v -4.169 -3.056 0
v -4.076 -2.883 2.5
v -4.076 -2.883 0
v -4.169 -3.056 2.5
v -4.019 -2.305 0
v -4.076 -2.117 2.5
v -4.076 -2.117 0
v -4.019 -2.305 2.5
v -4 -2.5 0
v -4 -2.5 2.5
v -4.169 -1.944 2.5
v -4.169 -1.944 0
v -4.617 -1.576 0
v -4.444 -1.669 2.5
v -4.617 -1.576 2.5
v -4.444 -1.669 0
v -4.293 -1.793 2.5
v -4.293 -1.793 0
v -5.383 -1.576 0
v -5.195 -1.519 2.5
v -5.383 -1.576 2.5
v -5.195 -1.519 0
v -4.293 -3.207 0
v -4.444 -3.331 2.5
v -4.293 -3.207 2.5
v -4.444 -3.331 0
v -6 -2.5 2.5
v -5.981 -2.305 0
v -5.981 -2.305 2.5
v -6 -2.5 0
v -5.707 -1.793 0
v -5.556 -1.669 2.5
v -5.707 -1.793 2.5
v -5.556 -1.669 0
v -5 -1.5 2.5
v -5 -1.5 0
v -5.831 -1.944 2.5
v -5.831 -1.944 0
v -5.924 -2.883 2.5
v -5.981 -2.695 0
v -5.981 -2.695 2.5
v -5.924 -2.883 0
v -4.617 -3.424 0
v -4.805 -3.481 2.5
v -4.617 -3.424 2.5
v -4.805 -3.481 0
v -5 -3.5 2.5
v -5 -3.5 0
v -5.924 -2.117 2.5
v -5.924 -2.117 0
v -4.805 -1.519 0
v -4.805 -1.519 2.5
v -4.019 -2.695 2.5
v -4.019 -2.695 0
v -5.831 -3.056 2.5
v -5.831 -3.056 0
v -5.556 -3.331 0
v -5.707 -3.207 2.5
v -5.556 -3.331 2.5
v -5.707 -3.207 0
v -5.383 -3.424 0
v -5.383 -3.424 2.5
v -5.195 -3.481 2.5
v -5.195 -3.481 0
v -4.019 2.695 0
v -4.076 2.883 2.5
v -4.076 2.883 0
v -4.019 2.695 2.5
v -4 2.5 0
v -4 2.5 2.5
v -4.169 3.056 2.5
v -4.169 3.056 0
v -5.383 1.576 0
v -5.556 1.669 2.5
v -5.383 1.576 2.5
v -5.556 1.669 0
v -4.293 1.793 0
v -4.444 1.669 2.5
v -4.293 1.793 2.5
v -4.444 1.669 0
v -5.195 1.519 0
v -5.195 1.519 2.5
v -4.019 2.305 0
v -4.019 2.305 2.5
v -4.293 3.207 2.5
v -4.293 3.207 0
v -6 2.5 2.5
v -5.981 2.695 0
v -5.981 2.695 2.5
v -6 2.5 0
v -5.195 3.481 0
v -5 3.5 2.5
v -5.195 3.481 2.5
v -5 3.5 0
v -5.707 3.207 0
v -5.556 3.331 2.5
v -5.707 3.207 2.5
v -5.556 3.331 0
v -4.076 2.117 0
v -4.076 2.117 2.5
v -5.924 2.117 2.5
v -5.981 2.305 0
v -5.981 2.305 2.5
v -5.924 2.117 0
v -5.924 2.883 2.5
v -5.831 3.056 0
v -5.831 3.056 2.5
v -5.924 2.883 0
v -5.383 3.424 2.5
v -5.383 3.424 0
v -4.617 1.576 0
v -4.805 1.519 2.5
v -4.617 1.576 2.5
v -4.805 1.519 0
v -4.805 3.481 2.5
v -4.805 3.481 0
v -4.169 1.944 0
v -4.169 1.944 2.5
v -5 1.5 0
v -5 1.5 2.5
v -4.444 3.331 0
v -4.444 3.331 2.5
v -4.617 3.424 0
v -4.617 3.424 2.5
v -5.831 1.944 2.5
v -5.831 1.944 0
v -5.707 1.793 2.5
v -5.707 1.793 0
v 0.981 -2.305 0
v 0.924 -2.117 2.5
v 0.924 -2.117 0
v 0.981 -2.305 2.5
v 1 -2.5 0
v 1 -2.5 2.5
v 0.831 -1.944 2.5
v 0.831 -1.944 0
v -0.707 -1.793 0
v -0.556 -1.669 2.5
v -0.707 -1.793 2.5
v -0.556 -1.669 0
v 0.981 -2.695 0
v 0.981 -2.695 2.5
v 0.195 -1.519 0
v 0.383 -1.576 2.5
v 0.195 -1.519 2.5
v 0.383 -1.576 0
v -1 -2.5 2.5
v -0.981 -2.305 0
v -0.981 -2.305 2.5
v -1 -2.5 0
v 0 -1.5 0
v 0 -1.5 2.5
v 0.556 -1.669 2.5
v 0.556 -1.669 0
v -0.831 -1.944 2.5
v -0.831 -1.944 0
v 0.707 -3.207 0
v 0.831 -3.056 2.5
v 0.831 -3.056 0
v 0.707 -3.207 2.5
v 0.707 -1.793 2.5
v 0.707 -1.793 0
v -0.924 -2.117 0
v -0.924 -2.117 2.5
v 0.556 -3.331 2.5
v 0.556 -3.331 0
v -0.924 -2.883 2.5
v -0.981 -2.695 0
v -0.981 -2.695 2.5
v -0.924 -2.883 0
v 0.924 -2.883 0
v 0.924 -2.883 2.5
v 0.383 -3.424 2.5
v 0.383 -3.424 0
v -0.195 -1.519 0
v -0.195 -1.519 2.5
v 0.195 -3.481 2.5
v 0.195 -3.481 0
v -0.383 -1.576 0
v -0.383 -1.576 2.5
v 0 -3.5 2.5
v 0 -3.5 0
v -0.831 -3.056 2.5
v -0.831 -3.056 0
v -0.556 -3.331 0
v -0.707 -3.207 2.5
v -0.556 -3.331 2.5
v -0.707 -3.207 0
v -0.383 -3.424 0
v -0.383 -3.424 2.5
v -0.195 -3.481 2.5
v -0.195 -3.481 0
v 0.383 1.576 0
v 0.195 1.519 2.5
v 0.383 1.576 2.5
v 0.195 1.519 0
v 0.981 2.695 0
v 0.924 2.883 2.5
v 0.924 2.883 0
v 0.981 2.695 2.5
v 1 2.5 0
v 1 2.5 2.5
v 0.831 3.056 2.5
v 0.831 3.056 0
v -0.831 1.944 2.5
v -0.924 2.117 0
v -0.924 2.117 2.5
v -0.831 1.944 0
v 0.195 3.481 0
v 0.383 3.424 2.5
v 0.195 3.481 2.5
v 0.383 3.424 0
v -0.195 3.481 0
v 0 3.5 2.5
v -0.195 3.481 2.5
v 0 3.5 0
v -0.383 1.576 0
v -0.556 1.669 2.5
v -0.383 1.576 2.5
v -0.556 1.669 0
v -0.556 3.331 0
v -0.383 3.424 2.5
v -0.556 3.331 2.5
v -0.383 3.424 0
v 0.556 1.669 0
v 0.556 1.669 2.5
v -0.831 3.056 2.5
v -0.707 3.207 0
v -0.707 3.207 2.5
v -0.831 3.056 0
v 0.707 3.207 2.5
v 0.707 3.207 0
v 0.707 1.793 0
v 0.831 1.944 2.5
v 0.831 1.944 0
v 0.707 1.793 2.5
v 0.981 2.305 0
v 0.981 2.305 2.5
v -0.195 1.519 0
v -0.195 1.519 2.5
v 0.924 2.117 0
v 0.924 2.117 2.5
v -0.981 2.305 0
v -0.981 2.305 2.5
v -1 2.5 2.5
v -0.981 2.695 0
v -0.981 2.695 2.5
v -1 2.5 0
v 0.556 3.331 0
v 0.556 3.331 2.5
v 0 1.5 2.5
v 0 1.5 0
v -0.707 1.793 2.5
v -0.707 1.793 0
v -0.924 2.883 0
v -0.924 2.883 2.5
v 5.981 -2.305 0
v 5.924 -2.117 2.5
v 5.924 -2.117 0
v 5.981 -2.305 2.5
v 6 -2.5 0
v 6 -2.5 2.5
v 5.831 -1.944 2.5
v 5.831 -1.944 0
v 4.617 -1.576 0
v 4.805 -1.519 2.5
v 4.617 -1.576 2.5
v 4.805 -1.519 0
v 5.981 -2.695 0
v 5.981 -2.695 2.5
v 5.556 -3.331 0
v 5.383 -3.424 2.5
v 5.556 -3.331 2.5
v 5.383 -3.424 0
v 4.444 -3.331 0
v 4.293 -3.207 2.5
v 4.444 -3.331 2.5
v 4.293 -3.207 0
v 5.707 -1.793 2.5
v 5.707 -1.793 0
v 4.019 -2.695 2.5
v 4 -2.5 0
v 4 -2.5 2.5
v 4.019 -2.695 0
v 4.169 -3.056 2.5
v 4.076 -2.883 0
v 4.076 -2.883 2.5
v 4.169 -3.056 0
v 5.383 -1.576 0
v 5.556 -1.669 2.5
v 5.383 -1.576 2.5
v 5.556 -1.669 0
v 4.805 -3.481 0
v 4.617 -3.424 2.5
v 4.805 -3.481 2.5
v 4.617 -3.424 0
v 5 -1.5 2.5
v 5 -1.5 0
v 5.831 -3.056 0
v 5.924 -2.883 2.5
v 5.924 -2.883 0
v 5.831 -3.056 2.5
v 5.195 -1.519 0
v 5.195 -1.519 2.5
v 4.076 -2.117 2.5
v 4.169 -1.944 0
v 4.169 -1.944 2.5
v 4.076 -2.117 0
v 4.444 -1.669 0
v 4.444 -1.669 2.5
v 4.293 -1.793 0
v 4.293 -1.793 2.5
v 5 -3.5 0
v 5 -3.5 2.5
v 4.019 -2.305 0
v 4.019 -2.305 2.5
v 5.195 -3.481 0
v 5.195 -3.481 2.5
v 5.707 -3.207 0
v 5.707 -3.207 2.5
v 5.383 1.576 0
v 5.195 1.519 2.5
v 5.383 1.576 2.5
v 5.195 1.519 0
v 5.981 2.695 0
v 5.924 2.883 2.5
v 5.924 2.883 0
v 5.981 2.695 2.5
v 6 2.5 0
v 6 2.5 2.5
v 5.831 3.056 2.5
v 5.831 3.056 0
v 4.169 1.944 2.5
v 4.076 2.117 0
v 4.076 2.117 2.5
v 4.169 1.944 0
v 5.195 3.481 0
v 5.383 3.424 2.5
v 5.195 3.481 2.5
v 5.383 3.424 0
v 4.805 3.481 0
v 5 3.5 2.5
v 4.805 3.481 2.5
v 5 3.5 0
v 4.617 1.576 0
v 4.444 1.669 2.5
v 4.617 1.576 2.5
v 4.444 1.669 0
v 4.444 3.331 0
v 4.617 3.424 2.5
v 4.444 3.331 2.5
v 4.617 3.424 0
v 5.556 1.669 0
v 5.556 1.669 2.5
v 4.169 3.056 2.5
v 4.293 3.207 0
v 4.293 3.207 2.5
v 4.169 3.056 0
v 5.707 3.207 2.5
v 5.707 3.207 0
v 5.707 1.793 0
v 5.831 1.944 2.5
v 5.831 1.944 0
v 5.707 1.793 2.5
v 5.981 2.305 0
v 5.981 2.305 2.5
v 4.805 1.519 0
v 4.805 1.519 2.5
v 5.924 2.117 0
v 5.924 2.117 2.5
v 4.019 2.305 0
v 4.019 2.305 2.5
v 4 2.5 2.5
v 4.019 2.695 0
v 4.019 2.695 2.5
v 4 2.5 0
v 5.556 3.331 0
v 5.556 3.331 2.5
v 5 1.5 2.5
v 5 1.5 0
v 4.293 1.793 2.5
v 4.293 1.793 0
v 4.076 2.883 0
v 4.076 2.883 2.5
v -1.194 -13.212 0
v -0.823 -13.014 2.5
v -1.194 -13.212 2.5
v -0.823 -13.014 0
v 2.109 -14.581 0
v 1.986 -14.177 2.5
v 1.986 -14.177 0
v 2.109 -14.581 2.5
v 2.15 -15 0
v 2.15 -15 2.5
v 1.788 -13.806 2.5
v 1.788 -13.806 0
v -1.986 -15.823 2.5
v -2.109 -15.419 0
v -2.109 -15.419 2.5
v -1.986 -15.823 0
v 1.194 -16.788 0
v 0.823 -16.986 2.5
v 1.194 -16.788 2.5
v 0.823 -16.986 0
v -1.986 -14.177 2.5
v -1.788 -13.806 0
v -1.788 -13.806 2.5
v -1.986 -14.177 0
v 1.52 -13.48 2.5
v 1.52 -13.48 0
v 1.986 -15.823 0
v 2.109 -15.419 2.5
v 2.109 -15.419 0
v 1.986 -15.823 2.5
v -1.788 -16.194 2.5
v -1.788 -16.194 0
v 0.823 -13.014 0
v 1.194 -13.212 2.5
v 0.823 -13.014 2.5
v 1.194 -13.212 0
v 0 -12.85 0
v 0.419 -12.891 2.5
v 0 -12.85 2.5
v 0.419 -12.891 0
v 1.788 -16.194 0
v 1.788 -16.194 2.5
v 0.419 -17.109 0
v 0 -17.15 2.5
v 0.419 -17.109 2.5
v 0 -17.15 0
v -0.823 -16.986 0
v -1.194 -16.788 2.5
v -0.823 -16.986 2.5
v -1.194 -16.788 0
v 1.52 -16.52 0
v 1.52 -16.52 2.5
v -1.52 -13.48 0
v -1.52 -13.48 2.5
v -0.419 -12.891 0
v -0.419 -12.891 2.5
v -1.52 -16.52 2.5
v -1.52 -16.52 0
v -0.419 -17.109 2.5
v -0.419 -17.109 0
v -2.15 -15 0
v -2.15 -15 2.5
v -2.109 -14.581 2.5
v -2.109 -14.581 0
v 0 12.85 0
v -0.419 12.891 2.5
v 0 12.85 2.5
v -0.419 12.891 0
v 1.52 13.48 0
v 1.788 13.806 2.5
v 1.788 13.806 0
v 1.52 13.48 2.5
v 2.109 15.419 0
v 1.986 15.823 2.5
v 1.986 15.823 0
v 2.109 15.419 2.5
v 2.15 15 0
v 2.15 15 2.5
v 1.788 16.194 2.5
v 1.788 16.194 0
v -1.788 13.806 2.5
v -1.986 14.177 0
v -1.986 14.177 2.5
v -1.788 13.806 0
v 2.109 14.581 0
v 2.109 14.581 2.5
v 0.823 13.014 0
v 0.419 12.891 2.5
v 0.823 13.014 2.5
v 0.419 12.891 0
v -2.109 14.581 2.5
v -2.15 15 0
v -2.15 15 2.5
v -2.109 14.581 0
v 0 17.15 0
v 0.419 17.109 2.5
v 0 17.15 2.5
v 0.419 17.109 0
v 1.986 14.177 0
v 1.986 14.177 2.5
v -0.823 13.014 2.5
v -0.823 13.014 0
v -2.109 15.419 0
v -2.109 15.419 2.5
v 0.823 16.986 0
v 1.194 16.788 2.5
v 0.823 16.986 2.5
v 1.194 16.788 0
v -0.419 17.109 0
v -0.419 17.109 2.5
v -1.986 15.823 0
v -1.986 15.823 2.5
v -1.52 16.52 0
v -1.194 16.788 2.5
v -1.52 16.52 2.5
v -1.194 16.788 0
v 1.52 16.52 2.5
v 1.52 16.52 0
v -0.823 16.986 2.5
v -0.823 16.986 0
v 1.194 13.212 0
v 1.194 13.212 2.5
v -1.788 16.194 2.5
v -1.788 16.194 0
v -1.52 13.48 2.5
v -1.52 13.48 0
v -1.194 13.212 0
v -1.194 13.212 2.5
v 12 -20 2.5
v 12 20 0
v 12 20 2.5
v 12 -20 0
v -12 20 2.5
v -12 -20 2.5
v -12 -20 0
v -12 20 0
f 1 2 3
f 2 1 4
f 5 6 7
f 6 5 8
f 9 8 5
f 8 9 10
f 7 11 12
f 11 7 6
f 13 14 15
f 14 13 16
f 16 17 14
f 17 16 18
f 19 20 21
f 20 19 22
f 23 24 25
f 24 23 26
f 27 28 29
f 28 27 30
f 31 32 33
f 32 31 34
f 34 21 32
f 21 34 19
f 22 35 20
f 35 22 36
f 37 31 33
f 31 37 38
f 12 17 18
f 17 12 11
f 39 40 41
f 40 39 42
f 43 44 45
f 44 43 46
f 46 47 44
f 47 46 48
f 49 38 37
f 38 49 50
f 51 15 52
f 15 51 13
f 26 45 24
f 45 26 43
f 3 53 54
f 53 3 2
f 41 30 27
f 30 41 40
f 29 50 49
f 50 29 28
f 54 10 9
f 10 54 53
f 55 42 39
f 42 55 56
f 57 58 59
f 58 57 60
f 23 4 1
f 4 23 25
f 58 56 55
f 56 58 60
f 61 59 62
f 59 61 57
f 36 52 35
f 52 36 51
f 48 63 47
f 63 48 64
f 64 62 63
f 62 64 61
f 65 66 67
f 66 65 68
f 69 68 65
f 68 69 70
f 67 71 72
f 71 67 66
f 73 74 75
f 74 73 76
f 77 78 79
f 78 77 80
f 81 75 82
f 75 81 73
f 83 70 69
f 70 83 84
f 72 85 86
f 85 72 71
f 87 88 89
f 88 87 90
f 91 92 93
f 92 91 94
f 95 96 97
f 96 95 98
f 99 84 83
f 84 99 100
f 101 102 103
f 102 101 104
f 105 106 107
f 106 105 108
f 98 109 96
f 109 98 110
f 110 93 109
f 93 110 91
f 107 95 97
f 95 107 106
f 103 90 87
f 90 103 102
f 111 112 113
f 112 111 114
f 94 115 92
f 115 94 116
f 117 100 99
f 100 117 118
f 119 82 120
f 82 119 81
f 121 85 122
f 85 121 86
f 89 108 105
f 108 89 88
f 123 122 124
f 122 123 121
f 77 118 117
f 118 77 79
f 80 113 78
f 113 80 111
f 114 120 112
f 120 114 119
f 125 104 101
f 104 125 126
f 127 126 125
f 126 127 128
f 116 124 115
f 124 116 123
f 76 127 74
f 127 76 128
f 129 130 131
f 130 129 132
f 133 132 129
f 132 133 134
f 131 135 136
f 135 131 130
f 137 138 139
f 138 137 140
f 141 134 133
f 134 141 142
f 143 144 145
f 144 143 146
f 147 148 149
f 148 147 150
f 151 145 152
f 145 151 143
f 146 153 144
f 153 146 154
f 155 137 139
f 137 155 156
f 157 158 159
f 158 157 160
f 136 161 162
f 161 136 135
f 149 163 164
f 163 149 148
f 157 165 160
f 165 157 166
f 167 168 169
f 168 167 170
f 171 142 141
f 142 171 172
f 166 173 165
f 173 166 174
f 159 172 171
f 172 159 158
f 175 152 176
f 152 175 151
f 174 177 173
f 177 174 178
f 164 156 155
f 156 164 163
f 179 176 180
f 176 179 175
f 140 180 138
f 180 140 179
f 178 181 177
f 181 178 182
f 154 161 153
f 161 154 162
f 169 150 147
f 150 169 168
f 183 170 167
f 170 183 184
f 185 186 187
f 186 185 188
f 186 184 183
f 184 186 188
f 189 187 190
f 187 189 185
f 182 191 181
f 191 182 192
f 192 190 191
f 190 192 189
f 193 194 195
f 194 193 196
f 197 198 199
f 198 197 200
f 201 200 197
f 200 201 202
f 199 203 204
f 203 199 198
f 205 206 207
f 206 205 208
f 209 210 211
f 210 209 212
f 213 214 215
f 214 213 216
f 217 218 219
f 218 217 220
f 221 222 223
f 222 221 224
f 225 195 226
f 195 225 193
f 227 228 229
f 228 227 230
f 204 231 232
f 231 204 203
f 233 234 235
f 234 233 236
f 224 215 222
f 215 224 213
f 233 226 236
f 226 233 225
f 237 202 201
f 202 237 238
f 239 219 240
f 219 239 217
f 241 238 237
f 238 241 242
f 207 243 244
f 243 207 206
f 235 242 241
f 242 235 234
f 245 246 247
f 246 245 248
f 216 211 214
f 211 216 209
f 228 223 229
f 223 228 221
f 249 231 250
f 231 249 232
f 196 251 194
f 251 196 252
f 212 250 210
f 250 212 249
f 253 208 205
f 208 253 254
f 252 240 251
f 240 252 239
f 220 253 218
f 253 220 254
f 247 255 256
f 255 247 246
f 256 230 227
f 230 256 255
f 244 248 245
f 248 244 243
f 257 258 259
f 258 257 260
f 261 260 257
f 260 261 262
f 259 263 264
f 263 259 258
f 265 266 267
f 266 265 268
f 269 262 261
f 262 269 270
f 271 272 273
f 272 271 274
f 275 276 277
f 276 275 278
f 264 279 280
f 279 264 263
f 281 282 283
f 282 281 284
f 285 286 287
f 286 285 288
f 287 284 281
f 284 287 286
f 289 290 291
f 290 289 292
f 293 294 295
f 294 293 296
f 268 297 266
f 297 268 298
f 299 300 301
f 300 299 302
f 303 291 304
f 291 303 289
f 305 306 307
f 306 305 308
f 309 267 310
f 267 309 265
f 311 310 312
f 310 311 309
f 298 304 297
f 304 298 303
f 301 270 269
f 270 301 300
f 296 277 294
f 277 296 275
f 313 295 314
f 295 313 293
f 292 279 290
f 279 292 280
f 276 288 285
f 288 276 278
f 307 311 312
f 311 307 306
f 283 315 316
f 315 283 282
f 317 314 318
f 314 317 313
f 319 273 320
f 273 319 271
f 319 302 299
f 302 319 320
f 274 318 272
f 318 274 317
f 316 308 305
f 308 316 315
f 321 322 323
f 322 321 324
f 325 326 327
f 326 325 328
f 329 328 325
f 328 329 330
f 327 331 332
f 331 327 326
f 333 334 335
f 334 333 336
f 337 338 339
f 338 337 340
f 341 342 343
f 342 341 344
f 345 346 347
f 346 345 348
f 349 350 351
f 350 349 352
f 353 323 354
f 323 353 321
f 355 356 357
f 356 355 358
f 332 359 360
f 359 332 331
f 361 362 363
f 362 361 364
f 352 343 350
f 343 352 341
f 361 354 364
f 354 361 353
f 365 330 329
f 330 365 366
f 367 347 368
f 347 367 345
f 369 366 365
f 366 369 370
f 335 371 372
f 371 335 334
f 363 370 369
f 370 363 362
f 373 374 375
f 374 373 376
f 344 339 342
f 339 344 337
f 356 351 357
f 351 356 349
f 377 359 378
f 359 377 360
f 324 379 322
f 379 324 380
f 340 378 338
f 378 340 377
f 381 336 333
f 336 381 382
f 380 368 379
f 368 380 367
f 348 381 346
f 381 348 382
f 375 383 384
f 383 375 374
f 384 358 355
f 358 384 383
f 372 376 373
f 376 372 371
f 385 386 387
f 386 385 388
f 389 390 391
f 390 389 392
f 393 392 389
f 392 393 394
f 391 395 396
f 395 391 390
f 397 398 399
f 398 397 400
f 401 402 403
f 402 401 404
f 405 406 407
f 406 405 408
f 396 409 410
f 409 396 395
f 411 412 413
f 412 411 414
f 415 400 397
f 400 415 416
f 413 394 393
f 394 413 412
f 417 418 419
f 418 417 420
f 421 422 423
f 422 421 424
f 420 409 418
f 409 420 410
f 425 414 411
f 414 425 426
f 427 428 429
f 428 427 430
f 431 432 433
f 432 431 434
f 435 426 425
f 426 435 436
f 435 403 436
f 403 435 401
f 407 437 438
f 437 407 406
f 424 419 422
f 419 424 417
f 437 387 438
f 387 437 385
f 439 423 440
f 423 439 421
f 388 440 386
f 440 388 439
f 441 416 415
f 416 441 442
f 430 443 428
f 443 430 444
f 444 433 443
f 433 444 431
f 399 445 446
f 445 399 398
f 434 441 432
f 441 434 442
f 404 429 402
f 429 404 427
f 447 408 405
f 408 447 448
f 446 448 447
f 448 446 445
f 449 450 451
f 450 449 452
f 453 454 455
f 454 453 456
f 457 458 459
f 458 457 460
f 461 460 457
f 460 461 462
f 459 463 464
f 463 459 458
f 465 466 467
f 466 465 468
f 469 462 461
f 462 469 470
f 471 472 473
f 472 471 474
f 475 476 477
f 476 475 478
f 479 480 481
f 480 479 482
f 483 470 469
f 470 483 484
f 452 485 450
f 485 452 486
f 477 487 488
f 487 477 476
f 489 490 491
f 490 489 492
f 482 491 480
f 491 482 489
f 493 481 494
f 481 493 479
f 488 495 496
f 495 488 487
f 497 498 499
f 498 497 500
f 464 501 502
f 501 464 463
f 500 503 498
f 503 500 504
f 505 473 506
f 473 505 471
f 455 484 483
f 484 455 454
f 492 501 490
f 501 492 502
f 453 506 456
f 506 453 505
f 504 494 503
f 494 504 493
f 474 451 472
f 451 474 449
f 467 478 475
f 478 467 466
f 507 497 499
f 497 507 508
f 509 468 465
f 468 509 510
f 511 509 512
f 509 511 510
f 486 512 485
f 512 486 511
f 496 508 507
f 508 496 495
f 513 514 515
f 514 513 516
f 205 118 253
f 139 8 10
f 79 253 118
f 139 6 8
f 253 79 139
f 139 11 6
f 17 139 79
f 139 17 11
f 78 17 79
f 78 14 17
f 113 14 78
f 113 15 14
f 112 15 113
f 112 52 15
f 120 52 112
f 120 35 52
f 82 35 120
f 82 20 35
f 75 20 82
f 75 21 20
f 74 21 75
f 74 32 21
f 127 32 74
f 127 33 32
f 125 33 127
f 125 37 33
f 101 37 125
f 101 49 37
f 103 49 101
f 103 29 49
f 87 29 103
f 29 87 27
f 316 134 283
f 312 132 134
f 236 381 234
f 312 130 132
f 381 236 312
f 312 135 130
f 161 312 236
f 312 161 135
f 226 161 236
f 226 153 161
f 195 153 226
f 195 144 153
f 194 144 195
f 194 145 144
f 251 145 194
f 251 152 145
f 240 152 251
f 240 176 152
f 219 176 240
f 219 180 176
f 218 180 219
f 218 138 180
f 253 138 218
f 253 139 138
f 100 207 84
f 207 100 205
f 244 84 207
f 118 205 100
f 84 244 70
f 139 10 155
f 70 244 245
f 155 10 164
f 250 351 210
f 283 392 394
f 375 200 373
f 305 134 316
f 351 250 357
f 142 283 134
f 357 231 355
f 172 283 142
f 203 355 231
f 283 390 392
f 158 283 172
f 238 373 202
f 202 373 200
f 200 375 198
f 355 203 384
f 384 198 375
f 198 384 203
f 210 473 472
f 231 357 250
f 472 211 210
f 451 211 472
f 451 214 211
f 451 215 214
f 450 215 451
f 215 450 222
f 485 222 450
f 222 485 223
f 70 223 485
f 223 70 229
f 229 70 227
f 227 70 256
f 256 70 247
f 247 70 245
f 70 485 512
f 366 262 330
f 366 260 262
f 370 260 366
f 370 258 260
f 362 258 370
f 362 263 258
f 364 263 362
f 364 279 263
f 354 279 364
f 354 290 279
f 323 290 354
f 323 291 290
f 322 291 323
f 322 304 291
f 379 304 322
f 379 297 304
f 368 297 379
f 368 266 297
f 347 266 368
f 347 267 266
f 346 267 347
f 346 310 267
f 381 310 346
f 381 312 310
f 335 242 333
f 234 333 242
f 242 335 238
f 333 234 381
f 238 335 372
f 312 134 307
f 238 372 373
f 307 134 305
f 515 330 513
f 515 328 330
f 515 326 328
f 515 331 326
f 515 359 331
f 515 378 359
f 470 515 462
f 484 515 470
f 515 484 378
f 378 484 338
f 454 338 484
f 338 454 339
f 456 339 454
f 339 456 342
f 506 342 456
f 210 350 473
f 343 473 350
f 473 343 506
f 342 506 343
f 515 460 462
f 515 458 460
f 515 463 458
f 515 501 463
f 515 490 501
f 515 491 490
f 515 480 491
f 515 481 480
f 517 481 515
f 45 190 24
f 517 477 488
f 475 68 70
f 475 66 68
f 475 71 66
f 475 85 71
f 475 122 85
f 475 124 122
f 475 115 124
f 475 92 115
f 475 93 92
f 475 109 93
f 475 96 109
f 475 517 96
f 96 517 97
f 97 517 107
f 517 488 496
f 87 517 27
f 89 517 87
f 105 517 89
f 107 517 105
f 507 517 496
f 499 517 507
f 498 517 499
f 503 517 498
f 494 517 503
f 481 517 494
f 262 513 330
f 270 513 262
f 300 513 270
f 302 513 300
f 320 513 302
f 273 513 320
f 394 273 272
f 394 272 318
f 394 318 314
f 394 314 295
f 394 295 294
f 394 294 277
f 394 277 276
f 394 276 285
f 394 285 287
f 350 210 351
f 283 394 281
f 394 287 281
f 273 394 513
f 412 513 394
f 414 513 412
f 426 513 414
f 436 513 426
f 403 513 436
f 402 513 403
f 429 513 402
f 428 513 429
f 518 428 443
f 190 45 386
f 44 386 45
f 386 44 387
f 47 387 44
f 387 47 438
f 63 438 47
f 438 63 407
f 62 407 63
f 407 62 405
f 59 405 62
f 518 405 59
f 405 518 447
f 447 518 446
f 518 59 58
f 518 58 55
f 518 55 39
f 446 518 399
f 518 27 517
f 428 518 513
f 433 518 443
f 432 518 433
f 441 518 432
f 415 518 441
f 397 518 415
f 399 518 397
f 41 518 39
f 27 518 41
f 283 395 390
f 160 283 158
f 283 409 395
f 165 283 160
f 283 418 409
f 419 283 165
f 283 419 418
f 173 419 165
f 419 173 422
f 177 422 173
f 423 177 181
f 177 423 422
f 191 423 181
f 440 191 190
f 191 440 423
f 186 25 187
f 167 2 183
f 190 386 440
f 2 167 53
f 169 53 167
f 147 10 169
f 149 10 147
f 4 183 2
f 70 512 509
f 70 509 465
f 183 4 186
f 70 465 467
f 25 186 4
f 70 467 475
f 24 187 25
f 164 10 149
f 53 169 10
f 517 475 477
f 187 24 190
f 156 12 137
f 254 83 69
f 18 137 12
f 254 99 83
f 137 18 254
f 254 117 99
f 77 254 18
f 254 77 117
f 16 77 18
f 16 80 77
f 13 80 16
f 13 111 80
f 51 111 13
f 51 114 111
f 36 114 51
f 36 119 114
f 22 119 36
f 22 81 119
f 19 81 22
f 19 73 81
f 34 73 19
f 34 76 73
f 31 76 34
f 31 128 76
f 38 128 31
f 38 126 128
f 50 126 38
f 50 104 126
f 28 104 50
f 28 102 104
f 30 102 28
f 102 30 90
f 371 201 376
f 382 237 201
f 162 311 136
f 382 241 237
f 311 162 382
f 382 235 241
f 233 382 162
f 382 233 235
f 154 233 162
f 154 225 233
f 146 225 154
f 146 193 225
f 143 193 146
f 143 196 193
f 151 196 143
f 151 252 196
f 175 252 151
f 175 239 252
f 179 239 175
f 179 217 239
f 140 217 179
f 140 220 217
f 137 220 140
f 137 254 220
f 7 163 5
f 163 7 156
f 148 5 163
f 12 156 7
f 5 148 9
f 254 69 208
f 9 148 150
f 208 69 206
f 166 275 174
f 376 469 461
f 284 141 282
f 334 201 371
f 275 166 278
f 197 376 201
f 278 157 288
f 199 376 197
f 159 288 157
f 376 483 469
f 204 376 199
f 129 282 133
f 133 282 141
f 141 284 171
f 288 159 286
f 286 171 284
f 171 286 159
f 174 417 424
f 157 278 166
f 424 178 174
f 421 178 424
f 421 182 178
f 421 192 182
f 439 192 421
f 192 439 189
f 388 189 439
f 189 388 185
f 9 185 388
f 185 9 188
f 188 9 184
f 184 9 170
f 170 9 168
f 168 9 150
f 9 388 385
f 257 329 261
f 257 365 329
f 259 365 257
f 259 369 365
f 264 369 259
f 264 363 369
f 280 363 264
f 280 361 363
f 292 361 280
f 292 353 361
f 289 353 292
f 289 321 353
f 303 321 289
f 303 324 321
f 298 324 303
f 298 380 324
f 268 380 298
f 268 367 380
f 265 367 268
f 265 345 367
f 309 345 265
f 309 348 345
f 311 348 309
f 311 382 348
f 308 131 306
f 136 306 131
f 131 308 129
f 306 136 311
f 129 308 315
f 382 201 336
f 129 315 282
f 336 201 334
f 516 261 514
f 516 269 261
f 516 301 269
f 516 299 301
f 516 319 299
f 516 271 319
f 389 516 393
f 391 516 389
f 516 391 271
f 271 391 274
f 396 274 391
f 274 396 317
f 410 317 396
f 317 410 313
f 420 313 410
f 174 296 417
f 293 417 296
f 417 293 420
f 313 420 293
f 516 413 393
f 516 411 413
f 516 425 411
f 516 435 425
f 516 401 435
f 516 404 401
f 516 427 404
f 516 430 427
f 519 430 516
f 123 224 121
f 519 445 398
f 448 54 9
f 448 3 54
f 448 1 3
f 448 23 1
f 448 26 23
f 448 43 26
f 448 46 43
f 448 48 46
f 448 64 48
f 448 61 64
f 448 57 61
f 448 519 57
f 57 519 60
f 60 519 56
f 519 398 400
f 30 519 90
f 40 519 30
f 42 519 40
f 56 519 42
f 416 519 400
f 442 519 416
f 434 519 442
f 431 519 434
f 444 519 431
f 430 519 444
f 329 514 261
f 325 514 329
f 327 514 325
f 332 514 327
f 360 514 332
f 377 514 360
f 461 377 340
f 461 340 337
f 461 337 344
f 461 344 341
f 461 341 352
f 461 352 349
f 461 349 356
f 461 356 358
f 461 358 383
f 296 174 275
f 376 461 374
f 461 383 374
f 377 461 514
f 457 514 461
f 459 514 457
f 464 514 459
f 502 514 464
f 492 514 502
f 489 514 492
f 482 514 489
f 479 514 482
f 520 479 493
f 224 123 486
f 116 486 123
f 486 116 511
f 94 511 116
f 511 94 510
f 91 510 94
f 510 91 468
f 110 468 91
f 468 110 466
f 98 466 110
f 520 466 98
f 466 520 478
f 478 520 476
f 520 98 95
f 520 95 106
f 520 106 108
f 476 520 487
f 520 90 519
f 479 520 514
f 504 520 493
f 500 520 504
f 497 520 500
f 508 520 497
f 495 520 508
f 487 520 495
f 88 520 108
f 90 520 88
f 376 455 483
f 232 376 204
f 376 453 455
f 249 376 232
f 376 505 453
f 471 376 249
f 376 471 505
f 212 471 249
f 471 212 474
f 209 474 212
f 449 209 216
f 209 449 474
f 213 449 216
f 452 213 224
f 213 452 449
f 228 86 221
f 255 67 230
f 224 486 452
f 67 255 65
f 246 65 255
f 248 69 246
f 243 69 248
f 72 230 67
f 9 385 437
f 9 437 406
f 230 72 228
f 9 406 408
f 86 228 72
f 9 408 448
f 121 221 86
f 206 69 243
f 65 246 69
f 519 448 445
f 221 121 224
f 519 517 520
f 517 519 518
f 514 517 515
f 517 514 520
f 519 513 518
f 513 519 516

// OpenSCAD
// ============================================================
// RS4 Pro RSA/NATOポート用 ポゴピン変換ハウジング（パラメトリック）
// ============================================================
//
// 【前提】DJI R SDK文書 Figure 39（v2.5, p.19）の図は旧世代(RS2)の
// 「突起ピン型」コネクタを描いており、RS4 Proの実物（平面パッド×6を
// 2×3グリッド配置＋上下M4ボルト穴でアクセサリ固定）とは形状が異なる。
// 既存STL（3d-print-ronin-can-connector.stl）はRS2向け8コンタクト
// 設計のため、そのままではRS4 Proに物理的に合わない可能性が高い。
//
// このファイルは実測値を下の PARAMETERS セクションに埋めるだけで
// RS4 Pro実機に合わせたハウジングを再生成できるようにしたテンプレート。
// 採寸手順は同ディレクトリの README.md を参照。
//
// 【使い方】
//   1. TEST_MODE = true でまず「穴位置確認用の平板」だけ印刷し、
//      実機に当てて6パッド全部にちゃんと重なるか確認する
//      （ここで数値を追い込む。ポゴピンはまだ実装しない）
//   2. 位置がずれなければ TEST_MODE = false にしてポゴピン用ボアと
//      配線室付きのフルモデルを生成→印刷→ポゴピン圧入/はんだ
//
// ============================================================

// ---------- PARAMETERS（★実測して埋める） ----------

// 動作モード: true=穴位置確認用の薄板のみ / false=フルモデル
TEST_MODE = true;

// パッドグリッド: 2列(row) × 3行(col) 想定。列間隔・行間隔をそれぞれ実測
pad_pitch_col   = 5.0;   // ★実測: 横方向(列)のパッド中心間距離 [mm]
pad_pitch_row   = 5.0;   // ★実測: 縦方向(行)のパッド中心間距離 [mm]
pad_diameter    = 2.0;   // ★実測: パッド自体の直径（接触面） [mm]
num_cols        = 3;     // グリッド列数（写真通りなら3のはず）
num_rows        = 2;     // グリッド行数（写真通りなら2のはず）

// 上下のM4固定穴（アクセサリを本体にボルト留めする穴）
mount_hole_dia     = 4.3;  // M4クリアランス穴 [mm]（M4ネジ径4.0+遊び）
mount_hole_spacing = 30.0; // ★実測: 上穴-下穴の中心間距離 [mm]
mount_hole_offset_x = 0;   // ★実測: パッドグリッド中心から見た穴の左右オフセット [mm]

// パッド面からの窪み量（実物はパッドが窪みの中にある、との観察あり）
pad_recess_depth = 0.5;  // ★実測: パッド面がハウジング取り付け面から何mm奥か [mm]

// ハウジング寸法
housing_w = 24;      // 全体の幅
housing_h = 40;      // 全体の高さ（M4穴を含む全長より少し大きく）
housing_wall_t = 3;  // 側壁厚
plate_t = 2.5;        // 取り付け面プレートの厚み（TEST_MODEはこれだけの板になる）

// ポゴピン（Preci-Dip 811-S1系を想定。発注前にデータシートで要再確認）
//
// 【固定方法（重要）】単純な一本ボアの圧入だけだと保持力が弱く、実際に
// 「接着できない/スコスコする」問題が出た。そこで二段ボアにする:
//   ①前面ランド（pogo_land_dia × pogo_land_len）
//     パッド面すぐ下、ピン外径にきっちり合わせた圧入代。ここを長めに
//     取ることでピンの直進性（パッドに対して垂直に立つ）が出るのと、
//     接着剤が毛細管現象で前面（接点面）まで染み出るのを防ぐ壁になる。
//   ②後方ポケット（pogo_glue_pocket_dia、深さ＝pogo_bore_depth−pogo_land_len）
//     配線室側に大きく開いた空間。配線室は既に外へ開放されているので、
//     ピンを高さ合わせして圧入した後、ここへエポキシ/UV硬化樹脂を
//     配線室側から流し込んで恒久固定できる。接点面には接着剤が一切
//     回らない構造。
//
// 【組み立て手順】
//   1. ピンを後ろ（配線室側）からランドへ通し、先端がパッド接触に必要な
//      突き出し量になるまで押し込む。ハウジング前面を平らな治具/ガラス板
//      に当てて全ピンを同時に押すと高さが揃う
//   2. マスキングテープ等で仮固定し、後方ポケットにエポキシを注入
//   3. 硬化を待ってから配線（ハンダ）
//
// Preci-Dip 811-S1系にツバ(フランジ)があれば、pogo_land_len をその
// フランジ位置に合わせるとポケット段差がハードストップになりさらに
// 高さ精度が上がる。データシート確認のうえ調整すること。
pogo_bore_dia    = 1.55; // ★前面ランド径（ピン外径+わずかな圧入代）[mm]。要データシート確認
pogo_land_len    = plate_t + 1.5; // 前面ランド長 [mm]（圧入+直進性+毛細管防止）
pogo_glue_pocket_dia = pogo_bore_dia + 1.2; // 後方エポキシポケット径 [mm]
pogo_bore_depth  = 6.0;  // ボア総深さ（前面から。ピン全長に合わせる）[mm]
pogo_body_len    = 8.5;  // ポゴピン全長の目安（配線室の深さ計算に使用）

// 配線室（背面にケーブルを引き出す空間）
wire_cavity_depth = 10;

// AD_COMプルダウン抵抗（10〜100kΩ）をコネクタ側に内蔵するためのポケット
// 「ESP32側配線し忘れ」を構造的に防ぐ狙い（2026-08-31の知見: 未実装が
// 疑われた実績あり）
resistor_pocket = true;
resistor_pocket_w = 6;
resistor_pocket_h = 3;
resistor_pocket_d = 3;

// ---------- 内部計算用 ----------
grid_w = (num_cols - 1) * pad_pitch_col;
grid_h = (num_rows - 1) * pad_pitch_row;

module pad_positions() {
    for (c = [0 : num_cols - 1])
        for (r = [0 : num_rows - 1])
            translate([
                -grid_w/2 + c * pad_pitch_col,
                -grid_h/2 + r * pad_pitch_row,
                0
            ])
            children();
}

module mount_holes() {
    for (dy = [-mount_hole_spacing/2, mount_hole_spacing/2])
        translate([mount_hole_offset_x, dy, 0])
        children();
}

// ポゴピン用の二段ボア（前面：圧入ランド／後方：接着ポケット）
// z=0がパッド面（前面）。pocket_depthが負にならないよう
// pogo_bore_depth > pogo_land_len を守ること。
pogo_pocket_depth = pogo_bore_depth - pogo_land_len;
assert(pogo_pocket_depth > 0.5,
    "pogo_bore_depth は pogo_land_len より十分大きくしてください（接着ポケット確保のため）");

module pogo_bore() {
    union() {
        // ①前面ランド（圧入・位置決め・毛細管防止の壁）
        translate([0, 0, -1])
            cylinder(d = pogo_bore_dia, h = pogo_land_len + 1, $fn = 24);
        // ②後方エポキシポケット（配線室側に開放、接着剤溜まり）
        translate([0, 0, pogo_land_len])
            cylinder(d = pogo_glue_pocket_dia, h = pogo_pocket_depth + 1, $fn = 24);
    }
}

// ---------- TEST_MODE: 穴位置確認用の薄板 ----------
module test_plate() {
    difference() {
        // ベースプレート（グリッド+M4穴が全部乗るサイズ）
        translate([-housing_w/2, -housing_h/2, 0])
            cube([housing_w, housing_h, plate_t]);

        // パッド位置を貫通穴で可視化（実機に重ねて位置確認する）
        pad_positions()
            translate([0, 0, -1])
            cylinder(d = pad_diameter, h = plate_t + 2, $fn = 32);

        // M4固定穴
        mount_holes()
            translate([0, 0, -1])
            cylinder(d = mount_hole_dia, h = plate_t + 2, $fn = 32);
    }
}

// ---------- フルモデル: ポゴピン圧入ハウジング ----------
module full_housing() {
    difference() {
        union() {
            // 取り付け面プレート
            translate([-housing_w/2, -housing_h/2, 0])
                cube([housing_w, housing_h, plate_t]);
            // 背面の配線室ボックス（外壁）
            translate([-housing_w/2, -housing_h/2, plate_t])
                cube([housing_w, housing_h, wire_cavity_depth + housing_wall_t]);
        }

        // 配線室の内側をくり抜く（壁厚housing_wall_tを残す）
        translate([
            -housing_w/2 + housing_wall_t,
            -housing_h/2 + housing_wall_t,
            plate_t
        ])
            cube([
                housing_w - 2*housing_wall_t,
                housing_h - 2*housing_wall_t,
                wire_cavity_depth + 1
            ]);

        // ポゴピン用ボア（前面ランド＋後方接着ポケットの二段構造）
        pad_positions()
            pogo_bore();

        // M4固定穴
        mount_holes()
            translate([0, 0, -1])
            cylinder(d = mount_hole_dia, h = plate_t + wire_cavity_depth + housing_wall_t + 2, $fn = 32);

        // AD_COMプルダウン抵抗ポケット（背面、配線室内の隅）
        if (resistor_pocket) {
            translate([
                housing_w/2 - housing_wall_t - resistor_pocket_w - 1,
                -housing_h/2 + housing_wall_t + 1,
                plate_t
            ])
                cube([resistor_pocket_w, resistor_pocket_h, resistor_pocket_d + 1]);
        }
    }
}

// ---------- 出力 ----------
if (TEST_MODE) {
    test_plate();
} else {
    full_housing();
}

// パッド番号の参考表示（印刷はされない。プレビュー確認用）
// Figure 39のピン配置（1=VCC 2=CANL 3=SBUS_RX 4=CANH 5=AD_COM 6=GND）を
// どのグリッド位置に割り当てるかは実機のテスター導通確認で決まるまで未確定。
// 決まったら pad_positions() のループ内でパッドごとにラベルコメントを追記すること。
